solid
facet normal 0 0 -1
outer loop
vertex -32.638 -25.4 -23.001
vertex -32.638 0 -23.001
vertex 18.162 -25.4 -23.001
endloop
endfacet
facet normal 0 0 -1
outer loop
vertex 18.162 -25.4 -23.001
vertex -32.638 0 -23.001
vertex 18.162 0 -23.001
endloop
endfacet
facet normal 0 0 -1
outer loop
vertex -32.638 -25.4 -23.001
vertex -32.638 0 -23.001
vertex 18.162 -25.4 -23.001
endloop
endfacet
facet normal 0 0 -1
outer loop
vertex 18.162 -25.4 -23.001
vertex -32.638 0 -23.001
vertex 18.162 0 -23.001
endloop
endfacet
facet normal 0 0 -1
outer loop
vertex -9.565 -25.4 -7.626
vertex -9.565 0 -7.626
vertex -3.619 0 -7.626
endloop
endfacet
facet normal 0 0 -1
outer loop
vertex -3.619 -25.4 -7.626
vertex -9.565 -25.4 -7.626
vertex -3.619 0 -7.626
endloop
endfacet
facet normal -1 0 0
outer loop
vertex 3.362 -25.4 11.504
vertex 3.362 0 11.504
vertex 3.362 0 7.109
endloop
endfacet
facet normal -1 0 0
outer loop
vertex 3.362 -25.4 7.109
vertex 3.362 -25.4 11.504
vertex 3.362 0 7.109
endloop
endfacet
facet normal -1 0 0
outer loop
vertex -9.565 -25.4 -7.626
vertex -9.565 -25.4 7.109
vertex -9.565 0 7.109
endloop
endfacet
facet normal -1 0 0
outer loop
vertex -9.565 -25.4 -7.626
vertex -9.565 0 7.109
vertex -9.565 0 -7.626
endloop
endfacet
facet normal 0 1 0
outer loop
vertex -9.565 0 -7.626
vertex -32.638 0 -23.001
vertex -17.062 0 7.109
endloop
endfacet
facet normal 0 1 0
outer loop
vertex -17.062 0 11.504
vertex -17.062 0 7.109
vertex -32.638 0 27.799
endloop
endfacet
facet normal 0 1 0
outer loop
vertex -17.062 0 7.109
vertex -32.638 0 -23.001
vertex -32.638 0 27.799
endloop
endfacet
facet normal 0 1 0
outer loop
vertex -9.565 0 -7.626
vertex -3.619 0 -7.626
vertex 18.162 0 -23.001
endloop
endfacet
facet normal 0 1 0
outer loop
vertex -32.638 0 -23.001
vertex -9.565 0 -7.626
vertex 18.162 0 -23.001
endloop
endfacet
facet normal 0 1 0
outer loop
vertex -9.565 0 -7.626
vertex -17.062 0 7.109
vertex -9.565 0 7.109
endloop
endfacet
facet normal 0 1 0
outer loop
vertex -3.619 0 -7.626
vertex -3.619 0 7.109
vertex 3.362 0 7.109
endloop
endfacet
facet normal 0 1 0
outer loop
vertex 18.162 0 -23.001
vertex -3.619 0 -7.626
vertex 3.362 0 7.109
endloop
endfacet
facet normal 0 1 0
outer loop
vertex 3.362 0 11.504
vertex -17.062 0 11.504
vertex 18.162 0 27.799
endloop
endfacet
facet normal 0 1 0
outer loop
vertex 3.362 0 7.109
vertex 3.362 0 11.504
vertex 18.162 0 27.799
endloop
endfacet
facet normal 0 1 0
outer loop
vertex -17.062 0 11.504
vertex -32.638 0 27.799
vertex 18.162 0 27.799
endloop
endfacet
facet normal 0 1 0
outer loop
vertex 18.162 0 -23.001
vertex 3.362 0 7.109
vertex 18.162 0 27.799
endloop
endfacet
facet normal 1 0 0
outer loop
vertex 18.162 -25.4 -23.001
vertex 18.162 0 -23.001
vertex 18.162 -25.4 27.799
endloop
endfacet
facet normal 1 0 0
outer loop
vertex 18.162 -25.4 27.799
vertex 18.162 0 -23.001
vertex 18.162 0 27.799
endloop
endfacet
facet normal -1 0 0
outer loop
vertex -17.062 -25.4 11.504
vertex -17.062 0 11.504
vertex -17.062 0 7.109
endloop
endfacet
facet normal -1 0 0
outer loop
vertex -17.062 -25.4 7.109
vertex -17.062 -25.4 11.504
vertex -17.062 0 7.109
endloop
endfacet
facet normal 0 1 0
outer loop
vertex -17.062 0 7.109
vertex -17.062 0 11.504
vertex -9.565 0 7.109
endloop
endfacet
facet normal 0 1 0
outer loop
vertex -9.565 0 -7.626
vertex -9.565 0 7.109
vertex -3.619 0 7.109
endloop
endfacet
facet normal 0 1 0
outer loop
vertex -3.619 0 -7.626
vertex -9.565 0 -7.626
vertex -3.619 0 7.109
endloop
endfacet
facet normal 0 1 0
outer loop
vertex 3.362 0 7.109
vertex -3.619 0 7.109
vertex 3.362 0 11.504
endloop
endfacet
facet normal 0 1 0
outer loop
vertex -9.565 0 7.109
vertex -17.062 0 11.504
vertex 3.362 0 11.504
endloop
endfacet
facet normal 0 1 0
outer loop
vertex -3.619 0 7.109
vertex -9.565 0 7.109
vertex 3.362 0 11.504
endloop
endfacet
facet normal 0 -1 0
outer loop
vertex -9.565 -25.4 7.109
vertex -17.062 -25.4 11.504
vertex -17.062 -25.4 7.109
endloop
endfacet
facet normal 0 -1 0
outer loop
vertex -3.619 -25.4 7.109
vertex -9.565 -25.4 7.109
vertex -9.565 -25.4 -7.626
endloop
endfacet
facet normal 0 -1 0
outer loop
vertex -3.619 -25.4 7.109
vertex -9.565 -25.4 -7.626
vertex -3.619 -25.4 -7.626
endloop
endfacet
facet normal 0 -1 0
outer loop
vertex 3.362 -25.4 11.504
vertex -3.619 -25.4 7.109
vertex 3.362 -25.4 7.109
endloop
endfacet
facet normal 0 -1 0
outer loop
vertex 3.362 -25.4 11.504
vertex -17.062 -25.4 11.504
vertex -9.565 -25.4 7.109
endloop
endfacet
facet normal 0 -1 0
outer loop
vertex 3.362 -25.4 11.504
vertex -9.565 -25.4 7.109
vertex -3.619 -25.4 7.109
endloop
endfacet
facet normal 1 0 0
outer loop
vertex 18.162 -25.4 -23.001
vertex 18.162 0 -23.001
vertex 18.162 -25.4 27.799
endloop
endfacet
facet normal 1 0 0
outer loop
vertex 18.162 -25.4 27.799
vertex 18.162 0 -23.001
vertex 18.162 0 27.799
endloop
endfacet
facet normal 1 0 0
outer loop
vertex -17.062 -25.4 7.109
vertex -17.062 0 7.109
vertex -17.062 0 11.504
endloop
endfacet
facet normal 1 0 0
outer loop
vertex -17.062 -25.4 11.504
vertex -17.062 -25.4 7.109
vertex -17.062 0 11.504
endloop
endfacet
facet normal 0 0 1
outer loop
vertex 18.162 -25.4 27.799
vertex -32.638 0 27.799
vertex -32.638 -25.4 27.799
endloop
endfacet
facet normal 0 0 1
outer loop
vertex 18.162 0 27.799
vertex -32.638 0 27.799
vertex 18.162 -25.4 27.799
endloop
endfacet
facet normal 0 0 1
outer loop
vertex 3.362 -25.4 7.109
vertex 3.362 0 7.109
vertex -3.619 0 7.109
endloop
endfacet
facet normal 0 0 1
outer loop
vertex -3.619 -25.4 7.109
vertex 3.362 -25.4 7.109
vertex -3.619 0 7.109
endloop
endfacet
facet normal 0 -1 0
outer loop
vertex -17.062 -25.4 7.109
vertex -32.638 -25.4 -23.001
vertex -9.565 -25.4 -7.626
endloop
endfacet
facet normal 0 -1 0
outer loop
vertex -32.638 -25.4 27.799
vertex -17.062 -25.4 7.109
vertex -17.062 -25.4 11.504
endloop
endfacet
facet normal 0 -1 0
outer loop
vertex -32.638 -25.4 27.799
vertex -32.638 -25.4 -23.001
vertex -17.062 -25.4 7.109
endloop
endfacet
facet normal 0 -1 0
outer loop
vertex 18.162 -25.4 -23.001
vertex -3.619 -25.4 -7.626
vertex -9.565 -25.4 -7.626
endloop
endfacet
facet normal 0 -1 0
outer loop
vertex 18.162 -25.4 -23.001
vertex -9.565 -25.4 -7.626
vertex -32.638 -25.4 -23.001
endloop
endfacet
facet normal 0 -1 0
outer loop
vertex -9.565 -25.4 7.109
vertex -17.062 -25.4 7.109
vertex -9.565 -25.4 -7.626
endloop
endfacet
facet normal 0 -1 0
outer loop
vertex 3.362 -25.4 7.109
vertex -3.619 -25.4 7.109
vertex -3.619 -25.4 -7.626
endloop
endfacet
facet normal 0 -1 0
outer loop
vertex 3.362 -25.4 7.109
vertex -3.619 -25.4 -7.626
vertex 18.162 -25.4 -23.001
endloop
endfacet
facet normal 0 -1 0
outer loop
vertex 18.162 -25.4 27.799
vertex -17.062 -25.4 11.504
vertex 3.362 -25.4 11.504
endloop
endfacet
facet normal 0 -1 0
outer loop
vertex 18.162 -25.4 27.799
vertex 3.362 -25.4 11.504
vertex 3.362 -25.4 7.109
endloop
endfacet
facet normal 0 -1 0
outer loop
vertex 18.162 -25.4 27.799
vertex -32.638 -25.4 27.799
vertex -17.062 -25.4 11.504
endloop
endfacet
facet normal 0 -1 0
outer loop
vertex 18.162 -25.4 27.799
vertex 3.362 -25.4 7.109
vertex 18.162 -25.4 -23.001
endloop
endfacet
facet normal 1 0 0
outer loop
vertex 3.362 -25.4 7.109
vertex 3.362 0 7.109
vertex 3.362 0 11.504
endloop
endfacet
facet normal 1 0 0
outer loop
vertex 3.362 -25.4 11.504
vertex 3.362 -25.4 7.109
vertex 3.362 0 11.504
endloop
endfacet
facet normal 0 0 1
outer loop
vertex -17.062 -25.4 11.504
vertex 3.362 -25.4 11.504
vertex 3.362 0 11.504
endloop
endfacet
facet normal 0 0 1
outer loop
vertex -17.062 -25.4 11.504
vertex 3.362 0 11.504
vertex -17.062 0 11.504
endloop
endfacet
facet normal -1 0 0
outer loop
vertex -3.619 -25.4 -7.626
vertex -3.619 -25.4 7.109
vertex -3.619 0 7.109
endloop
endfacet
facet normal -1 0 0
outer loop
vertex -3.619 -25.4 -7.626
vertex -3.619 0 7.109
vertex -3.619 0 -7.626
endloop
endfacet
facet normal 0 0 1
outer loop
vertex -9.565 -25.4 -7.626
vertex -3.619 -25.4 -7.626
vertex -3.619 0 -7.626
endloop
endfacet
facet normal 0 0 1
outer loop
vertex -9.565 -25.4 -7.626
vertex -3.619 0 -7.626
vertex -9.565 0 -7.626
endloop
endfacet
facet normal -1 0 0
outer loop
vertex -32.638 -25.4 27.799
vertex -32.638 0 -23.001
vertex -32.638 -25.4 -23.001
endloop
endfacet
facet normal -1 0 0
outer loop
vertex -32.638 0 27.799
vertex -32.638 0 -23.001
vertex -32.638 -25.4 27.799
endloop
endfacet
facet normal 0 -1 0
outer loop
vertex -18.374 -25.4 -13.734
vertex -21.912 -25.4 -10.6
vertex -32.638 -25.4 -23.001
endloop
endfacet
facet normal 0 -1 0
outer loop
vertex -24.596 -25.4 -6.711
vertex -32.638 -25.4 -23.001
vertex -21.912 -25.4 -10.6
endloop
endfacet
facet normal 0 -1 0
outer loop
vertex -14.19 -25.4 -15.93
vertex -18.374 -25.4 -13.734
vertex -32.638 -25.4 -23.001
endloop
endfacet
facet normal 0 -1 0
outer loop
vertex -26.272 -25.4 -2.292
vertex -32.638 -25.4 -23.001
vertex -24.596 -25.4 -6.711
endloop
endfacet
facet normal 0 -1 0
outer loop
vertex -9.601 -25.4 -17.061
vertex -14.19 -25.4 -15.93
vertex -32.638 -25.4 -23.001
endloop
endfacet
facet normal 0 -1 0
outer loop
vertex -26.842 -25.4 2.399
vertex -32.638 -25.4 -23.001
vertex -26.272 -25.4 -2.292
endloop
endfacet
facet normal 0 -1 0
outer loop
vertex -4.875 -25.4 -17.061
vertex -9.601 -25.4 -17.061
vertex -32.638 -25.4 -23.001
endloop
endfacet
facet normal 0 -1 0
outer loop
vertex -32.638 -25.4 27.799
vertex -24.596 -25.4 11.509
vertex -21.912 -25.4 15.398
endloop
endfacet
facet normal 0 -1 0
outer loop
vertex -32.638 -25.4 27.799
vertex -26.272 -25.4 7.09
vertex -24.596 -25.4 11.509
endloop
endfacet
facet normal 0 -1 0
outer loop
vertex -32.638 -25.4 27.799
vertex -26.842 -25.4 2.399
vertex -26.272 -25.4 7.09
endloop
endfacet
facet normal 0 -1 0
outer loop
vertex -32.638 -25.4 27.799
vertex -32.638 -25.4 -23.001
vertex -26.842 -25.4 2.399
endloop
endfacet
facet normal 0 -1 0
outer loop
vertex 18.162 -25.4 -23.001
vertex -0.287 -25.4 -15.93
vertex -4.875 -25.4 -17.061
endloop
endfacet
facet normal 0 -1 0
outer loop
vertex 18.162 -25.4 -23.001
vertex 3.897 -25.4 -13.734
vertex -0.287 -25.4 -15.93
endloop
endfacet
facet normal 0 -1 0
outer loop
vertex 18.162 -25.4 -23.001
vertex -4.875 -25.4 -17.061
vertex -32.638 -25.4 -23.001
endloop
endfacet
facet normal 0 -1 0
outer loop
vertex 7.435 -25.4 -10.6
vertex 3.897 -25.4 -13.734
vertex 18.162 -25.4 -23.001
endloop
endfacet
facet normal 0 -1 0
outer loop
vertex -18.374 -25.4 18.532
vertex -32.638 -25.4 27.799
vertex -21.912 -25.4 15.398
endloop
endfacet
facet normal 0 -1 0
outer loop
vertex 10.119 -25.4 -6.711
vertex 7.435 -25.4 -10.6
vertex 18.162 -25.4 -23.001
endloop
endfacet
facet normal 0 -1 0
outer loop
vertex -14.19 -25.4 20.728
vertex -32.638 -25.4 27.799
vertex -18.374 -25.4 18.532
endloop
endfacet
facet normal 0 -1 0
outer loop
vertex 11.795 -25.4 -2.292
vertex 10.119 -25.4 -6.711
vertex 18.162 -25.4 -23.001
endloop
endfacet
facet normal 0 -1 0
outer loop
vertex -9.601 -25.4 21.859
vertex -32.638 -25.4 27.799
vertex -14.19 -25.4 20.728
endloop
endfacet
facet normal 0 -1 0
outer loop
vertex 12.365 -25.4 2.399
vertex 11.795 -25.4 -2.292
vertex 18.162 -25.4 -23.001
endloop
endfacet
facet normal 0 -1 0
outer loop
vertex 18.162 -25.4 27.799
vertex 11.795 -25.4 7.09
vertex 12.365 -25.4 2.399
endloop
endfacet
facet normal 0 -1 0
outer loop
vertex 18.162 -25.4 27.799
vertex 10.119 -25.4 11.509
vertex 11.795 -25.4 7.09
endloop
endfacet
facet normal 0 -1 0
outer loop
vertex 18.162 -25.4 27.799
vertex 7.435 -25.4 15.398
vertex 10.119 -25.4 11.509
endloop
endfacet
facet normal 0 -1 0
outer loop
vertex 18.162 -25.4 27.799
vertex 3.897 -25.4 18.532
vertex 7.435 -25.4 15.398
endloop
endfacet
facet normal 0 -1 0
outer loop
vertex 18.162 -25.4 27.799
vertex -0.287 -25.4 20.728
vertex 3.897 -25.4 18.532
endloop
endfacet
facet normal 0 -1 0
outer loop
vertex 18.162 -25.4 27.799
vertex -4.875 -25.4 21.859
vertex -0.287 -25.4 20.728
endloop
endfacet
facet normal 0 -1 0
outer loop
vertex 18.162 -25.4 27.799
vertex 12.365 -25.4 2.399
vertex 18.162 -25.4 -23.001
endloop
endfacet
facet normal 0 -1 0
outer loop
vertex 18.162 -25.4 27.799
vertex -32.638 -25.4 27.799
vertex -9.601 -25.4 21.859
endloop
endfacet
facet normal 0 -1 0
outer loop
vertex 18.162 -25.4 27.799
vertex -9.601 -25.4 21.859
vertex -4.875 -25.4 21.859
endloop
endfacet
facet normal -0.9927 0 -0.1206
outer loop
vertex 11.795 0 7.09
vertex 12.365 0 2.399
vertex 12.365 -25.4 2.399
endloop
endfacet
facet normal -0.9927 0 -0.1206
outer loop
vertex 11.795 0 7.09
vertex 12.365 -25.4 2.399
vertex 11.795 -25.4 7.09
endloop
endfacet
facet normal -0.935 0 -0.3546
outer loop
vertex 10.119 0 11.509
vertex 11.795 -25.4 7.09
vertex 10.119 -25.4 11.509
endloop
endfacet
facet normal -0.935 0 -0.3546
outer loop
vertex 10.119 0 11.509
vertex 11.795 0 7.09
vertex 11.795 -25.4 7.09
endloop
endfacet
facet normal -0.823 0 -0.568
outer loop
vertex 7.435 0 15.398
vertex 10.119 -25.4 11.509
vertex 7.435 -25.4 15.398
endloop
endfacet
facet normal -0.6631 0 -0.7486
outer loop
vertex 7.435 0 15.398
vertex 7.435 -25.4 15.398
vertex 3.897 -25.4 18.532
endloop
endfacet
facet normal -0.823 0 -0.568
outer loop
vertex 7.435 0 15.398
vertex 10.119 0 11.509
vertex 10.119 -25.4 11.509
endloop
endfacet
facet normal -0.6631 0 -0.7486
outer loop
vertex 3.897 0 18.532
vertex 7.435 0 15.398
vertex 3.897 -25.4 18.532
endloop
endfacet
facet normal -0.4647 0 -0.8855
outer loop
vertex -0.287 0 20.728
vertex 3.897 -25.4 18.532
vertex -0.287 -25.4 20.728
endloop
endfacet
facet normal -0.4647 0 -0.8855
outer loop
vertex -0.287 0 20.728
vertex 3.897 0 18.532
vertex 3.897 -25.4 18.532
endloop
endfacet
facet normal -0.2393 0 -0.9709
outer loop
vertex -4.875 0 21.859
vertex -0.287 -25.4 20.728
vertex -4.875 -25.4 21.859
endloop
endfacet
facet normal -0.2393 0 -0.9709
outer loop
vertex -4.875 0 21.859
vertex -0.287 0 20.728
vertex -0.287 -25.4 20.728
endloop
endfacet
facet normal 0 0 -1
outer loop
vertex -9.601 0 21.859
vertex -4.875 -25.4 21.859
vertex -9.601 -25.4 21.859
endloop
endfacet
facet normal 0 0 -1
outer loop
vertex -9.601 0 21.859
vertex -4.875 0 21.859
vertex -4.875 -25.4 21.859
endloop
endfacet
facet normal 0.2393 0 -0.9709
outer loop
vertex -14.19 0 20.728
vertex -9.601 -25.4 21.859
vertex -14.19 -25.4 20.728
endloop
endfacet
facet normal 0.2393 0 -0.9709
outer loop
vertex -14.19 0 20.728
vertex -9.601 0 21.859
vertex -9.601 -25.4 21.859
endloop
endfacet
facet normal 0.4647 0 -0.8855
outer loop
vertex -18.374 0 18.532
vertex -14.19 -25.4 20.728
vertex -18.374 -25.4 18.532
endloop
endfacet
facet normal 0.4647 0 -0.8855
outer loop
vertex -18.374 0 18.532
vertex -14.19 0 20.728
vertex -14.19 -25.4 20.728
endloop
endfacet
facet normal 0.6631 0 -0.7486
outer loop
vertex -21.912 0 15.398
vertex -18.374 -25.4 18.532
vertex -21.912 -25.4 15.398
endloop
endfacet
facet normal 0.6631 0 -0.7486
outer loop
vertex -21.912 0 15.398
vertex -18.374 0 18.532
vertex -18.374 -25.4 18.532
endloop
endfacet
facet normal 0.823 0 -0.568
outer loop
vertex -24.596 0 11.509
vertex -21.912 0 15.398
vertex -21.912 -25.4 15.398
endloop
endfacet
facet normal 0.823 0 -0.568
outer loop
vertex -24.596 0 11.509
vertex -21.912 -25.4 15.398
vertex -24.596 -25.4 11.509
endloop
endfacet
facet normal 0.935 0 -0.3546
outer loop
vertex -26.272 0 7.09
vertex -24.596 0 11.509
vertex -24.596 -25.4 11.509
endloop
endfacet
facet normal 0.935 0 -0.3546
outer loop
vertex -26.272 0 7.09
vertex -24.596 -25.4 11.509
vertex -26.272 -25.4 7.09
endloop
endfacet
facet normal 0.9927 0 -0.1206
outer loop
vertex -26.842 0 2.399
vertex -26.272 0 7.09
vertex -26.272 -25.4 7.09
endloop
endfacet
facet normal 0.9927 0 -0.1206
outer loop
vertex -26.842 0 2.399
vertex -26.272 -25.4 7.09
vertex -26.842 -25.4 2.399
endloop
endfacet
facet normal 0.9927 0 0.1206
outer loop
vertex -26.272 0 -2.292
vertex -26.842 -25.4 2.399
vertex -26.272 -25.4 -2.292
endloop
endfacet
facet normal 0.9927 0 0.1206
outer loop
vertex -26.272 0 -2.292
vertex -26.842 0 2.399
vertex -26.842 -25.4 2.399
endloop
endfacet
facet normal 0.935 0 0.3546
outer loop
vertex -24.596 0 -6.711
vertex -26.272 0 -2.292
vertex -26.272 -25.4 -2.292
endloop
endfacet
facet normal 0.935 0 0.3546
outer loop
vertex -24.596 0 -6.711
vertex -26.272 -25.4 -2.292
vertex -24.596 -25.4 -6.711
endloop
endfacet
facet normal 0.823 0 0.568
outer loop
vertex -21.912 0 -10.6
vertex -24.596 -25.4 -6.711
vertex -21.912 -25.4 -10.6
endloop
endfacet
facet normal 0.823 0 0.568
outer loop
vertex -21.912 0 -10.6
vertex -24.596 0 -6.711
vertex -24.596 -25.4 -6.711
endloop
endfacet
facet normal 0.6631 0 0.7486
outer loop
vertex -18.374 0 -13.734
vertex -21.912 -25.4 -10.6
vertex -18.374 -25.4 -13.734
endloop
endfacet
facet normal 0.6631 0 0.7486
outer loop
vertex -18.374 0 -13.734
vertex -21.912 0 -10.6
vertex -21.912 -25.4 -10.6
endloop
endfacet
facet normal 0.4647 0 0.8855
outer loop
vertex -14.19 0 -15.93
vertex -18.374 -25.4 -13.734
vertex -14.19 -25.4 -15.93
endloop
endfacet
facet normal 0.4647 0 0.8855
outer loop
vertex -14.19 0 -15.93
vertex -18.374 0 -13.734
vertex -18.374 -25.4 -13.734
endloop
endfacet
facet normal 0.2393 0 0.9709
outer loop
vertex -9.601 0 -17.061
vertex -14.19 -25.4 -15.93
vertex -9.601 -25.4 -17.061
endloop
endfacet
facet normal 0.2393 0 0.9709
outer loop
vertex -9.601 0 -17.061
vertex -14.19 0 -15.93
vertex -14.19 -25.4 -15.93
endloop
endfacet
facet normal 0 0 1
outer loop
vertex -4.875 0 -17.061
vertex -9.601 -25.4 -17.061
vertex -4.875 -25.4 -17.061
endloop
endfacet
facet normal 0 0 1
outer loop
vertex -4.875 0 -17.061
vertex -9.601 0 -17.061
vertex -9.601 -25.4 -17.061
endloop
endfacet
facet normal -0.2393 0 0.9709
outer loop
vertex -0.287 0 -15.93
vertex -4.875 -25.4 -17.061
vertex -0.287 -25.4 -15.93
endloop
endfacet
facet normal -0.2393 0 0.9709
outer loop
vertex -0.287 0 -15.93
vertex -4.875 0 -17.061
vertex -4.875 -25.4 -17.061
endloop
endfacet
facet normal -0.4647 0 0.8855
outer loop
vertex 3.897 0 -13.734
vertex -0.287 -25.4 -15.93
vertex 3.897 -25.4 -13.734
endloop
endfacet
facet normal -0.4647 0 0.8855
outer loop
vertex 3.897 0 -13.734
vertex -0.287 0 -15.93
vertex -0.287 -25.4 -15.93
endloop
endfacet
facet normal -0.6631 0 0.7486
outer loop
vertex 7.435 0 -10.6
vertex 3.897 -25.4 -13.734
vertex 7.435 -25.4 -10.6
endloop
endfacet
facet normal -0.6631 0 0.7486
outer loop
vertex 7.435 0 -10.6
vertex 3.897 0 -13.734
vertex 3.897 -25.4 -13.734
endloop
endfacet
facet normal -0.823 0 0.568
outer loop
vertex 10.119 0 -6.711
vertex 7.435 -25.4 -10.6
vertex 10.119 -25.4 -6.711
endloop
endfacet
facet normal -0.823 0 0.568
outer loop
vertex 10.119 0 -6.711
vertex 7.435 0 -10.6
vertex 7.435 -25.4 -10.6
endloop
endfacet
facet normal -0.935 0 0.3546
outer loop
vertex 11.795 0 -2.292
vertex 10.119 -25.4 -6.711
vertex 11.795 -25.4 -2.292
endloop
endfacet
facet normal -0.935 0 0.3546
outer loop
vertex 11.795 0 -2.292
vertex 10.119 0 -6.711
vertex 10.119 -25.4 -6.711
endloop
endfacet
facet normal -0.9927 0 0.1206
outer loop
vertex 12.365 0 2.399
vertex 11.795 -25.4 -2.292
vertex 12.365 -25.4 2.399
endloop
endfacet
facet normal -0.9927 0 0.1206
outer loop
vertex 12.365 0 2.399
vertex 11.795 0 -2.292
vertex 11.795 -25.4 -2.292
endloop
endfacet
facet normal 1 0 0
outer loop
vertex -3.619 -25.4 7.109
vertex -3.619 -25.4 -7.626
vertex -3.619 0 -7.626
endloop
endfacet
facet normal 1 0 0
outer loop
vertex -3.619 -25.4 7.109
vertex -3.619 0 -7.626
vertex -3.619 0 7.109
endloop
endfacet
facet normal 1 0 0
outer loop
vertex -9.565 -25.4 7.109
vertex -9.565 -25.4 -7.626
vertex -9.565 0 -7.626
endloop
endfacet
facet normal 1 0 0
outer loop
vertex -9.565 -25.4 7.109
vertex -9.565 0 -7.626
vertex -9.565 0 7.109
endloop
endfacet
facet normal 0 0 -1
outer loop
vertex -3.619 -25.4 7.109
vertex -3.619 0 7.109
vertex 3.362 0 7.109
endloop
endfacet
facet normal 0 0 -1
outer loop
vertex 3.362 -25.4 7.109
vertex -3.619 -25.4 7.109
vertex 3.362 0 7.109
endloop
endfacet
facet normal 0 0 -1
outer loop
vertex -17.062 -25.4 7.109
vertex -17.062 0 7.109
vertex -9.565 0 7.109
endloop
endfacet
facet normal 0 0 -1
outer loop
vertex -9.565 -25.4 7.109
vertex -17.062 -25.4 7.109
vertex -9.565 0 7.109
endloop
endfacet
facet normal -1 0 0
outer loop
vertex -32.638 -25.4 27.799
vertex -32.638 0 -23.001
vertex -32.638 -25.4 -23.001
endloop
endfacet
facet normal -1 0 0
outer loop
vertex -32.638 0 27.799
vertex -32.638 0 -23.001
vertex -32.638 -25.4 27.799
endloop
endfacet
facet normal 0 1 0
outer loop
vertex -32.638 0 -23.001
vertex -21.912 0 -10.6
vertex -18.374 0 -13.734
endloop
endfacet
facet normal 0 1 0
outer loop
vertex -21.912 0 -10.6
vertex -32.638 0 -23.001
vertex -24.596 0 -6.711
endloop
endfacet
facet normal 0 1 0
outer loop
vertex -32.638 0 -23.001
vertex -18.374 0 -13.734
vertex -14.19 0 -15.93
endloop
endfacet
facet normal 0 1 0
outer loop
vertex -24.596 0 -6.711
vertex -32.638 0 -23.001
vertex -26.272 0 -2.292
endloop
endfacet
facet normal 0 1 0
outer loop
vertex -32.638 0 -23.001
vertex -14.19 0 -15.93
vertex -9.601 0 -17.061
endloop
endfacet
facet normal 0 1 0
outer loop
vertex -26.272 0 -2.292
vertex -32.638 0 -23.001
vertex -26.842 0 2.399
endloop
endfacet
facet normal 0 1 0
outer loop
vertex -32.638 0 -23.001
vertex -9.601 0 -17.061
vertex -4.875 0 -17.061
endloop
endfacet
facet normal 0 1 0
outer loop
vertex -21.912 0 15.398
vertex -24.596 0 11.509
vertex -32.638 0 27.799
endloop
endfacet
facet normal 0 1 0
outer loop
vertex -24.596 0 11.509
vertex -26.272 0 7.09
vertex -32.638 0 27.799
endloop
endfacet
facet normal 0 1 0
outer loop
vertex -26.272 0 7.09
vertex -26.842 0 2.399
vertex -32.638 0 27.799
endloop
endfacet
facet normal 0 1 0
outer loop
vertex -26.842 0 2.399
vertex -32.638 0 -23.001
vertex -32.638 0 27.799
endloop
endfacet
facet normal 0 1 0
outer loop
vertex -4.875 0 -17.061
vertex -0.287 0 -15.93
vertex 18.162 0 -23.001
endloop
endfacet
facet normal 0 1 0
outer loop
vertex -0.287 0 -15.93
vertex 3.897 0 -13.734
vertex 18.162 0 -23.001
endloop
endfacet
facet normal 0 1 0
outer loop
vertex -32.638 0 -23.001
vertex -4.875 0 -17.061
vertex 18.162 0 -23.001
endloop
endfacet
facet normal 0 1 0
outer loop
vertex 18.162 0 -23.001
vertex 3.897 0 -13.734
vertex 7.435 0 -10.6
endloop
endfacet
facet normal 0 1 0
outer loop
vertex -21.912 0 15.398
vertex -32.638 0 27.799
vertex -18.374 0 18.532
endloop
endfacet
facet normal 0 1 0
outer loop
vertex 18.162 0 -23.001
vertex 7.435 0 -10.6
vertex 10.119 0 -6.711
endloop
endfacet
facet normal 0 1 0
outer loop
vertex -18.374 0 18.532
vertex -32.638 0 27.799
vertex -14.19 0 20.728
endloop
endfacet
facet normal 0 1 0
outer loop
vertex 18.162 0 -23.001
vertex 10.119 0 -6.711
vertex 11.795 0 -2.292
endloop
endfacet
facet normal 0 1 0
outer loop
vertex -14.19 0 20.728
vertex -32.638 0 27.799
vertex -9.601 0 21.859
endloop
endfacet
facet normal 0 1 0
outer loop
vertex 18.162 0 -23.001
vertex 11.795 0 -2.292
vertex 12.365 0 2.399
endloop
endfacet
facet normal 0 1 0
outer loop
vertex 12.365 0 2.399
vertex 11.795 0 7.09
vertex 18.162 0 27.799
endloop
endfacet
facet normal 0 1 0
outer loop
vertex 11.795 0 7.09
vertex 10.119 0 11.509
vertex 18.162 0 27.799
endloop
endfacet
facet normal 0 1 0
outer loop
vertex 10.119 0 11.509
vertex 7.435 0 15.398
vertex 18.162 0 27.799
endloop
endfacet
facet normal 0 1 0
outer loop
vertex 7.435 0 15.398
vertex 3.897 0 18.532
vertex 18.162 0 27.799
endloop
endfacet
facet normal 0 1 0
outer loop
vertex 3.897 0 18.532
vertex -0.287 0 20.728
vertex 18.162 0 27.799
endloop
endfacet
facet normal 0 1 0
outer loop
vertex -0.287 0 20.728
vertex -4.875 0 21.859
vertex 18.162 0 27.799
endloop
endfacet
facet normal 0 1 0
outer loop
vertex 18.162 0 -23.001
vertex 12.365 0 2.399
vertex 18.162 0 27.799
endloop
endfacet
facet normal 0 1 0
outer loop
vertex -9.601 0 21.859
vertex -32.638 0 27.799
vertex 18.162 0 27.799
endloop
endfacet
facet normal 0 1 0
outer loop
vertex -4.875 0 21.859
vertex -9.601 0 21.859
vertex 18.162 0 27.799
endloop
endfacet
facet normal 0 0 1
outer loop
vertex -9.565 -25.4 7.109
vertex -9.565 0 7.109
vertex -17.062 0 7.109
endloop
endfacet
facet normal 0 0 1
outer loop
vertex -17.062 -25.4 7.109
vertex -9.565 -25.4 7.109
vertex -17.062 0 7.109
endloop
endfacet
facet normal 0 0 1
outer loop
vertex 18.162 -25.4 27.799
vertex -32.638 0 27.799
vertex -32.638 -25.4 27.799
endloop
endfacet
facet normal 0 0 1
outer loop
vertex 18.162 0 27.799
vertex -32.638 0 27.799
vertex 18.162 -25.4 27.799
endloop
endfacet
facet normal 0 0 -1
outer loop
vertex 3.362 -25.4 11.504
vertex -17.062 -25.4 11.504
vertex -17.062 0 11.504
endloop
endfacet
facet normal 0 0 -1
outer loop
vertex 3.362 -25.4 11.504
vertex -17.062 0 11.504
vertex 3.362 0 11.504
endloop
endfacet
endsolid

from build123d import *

# Parameters (mm, degrees)
F0_W     = 50.8
F0_H     = 50.8
F0_R     = 19.603193
F1_DEPTH = 25.4
F2_DEPTH = 25.4


with BuildPart() as f1:
    # F0 (on Front) → F1 (new body)
    with BuildSketch(Plane.XZ):
        with Locations((-7.238384, 2.398915)):
            Rectangle(F0_W, F0_H)
        with Locations((-7.238384, 2.398915)):
            Circle(F0_R, mode=Mode.SUBTRACT)
        Polygon((3.361762, 11.503861), (-17.062299, 11.503861), (-17.062299, 7.109127), (-9.564858, 7.109127), (-9.564858, -7.626155), (-3.618613, -7.626155), (-3.618613, 7.109127), (3.361762, 7.109127), align=None)
    extrude(amount=F1_DEPTH)


with BuildPart() as f2:
    # F0 (on Front) → F2 (new body)
    with BuildSketch(Plane.XZ):
        with Locations((-7.238384, 2.398915)):
            Rectangle(F0_W, F0_H)
        with Locations((-7.238384, 2.398915)):
            Circle(F0_R, mode=Mode.SUBTRACT)
        with Locations((-7.238384, 2.398915)):
            Circle(F0_R)
        Polygon((-17.062299, 7.109127), (-17.062299, 11.503861), (3.361762, 11.503861), (3.361762, 7.109127), (-3.618613, 7.109127), (-3.618613, -7.626155), (-9.564858, -7.626155), (-9.564858, 7.109127), align=None, mode=Mode.SUBTRACT)
    extrude(amount=F2_DEPTH)


solid = Compound([f1.part, f2.part])
